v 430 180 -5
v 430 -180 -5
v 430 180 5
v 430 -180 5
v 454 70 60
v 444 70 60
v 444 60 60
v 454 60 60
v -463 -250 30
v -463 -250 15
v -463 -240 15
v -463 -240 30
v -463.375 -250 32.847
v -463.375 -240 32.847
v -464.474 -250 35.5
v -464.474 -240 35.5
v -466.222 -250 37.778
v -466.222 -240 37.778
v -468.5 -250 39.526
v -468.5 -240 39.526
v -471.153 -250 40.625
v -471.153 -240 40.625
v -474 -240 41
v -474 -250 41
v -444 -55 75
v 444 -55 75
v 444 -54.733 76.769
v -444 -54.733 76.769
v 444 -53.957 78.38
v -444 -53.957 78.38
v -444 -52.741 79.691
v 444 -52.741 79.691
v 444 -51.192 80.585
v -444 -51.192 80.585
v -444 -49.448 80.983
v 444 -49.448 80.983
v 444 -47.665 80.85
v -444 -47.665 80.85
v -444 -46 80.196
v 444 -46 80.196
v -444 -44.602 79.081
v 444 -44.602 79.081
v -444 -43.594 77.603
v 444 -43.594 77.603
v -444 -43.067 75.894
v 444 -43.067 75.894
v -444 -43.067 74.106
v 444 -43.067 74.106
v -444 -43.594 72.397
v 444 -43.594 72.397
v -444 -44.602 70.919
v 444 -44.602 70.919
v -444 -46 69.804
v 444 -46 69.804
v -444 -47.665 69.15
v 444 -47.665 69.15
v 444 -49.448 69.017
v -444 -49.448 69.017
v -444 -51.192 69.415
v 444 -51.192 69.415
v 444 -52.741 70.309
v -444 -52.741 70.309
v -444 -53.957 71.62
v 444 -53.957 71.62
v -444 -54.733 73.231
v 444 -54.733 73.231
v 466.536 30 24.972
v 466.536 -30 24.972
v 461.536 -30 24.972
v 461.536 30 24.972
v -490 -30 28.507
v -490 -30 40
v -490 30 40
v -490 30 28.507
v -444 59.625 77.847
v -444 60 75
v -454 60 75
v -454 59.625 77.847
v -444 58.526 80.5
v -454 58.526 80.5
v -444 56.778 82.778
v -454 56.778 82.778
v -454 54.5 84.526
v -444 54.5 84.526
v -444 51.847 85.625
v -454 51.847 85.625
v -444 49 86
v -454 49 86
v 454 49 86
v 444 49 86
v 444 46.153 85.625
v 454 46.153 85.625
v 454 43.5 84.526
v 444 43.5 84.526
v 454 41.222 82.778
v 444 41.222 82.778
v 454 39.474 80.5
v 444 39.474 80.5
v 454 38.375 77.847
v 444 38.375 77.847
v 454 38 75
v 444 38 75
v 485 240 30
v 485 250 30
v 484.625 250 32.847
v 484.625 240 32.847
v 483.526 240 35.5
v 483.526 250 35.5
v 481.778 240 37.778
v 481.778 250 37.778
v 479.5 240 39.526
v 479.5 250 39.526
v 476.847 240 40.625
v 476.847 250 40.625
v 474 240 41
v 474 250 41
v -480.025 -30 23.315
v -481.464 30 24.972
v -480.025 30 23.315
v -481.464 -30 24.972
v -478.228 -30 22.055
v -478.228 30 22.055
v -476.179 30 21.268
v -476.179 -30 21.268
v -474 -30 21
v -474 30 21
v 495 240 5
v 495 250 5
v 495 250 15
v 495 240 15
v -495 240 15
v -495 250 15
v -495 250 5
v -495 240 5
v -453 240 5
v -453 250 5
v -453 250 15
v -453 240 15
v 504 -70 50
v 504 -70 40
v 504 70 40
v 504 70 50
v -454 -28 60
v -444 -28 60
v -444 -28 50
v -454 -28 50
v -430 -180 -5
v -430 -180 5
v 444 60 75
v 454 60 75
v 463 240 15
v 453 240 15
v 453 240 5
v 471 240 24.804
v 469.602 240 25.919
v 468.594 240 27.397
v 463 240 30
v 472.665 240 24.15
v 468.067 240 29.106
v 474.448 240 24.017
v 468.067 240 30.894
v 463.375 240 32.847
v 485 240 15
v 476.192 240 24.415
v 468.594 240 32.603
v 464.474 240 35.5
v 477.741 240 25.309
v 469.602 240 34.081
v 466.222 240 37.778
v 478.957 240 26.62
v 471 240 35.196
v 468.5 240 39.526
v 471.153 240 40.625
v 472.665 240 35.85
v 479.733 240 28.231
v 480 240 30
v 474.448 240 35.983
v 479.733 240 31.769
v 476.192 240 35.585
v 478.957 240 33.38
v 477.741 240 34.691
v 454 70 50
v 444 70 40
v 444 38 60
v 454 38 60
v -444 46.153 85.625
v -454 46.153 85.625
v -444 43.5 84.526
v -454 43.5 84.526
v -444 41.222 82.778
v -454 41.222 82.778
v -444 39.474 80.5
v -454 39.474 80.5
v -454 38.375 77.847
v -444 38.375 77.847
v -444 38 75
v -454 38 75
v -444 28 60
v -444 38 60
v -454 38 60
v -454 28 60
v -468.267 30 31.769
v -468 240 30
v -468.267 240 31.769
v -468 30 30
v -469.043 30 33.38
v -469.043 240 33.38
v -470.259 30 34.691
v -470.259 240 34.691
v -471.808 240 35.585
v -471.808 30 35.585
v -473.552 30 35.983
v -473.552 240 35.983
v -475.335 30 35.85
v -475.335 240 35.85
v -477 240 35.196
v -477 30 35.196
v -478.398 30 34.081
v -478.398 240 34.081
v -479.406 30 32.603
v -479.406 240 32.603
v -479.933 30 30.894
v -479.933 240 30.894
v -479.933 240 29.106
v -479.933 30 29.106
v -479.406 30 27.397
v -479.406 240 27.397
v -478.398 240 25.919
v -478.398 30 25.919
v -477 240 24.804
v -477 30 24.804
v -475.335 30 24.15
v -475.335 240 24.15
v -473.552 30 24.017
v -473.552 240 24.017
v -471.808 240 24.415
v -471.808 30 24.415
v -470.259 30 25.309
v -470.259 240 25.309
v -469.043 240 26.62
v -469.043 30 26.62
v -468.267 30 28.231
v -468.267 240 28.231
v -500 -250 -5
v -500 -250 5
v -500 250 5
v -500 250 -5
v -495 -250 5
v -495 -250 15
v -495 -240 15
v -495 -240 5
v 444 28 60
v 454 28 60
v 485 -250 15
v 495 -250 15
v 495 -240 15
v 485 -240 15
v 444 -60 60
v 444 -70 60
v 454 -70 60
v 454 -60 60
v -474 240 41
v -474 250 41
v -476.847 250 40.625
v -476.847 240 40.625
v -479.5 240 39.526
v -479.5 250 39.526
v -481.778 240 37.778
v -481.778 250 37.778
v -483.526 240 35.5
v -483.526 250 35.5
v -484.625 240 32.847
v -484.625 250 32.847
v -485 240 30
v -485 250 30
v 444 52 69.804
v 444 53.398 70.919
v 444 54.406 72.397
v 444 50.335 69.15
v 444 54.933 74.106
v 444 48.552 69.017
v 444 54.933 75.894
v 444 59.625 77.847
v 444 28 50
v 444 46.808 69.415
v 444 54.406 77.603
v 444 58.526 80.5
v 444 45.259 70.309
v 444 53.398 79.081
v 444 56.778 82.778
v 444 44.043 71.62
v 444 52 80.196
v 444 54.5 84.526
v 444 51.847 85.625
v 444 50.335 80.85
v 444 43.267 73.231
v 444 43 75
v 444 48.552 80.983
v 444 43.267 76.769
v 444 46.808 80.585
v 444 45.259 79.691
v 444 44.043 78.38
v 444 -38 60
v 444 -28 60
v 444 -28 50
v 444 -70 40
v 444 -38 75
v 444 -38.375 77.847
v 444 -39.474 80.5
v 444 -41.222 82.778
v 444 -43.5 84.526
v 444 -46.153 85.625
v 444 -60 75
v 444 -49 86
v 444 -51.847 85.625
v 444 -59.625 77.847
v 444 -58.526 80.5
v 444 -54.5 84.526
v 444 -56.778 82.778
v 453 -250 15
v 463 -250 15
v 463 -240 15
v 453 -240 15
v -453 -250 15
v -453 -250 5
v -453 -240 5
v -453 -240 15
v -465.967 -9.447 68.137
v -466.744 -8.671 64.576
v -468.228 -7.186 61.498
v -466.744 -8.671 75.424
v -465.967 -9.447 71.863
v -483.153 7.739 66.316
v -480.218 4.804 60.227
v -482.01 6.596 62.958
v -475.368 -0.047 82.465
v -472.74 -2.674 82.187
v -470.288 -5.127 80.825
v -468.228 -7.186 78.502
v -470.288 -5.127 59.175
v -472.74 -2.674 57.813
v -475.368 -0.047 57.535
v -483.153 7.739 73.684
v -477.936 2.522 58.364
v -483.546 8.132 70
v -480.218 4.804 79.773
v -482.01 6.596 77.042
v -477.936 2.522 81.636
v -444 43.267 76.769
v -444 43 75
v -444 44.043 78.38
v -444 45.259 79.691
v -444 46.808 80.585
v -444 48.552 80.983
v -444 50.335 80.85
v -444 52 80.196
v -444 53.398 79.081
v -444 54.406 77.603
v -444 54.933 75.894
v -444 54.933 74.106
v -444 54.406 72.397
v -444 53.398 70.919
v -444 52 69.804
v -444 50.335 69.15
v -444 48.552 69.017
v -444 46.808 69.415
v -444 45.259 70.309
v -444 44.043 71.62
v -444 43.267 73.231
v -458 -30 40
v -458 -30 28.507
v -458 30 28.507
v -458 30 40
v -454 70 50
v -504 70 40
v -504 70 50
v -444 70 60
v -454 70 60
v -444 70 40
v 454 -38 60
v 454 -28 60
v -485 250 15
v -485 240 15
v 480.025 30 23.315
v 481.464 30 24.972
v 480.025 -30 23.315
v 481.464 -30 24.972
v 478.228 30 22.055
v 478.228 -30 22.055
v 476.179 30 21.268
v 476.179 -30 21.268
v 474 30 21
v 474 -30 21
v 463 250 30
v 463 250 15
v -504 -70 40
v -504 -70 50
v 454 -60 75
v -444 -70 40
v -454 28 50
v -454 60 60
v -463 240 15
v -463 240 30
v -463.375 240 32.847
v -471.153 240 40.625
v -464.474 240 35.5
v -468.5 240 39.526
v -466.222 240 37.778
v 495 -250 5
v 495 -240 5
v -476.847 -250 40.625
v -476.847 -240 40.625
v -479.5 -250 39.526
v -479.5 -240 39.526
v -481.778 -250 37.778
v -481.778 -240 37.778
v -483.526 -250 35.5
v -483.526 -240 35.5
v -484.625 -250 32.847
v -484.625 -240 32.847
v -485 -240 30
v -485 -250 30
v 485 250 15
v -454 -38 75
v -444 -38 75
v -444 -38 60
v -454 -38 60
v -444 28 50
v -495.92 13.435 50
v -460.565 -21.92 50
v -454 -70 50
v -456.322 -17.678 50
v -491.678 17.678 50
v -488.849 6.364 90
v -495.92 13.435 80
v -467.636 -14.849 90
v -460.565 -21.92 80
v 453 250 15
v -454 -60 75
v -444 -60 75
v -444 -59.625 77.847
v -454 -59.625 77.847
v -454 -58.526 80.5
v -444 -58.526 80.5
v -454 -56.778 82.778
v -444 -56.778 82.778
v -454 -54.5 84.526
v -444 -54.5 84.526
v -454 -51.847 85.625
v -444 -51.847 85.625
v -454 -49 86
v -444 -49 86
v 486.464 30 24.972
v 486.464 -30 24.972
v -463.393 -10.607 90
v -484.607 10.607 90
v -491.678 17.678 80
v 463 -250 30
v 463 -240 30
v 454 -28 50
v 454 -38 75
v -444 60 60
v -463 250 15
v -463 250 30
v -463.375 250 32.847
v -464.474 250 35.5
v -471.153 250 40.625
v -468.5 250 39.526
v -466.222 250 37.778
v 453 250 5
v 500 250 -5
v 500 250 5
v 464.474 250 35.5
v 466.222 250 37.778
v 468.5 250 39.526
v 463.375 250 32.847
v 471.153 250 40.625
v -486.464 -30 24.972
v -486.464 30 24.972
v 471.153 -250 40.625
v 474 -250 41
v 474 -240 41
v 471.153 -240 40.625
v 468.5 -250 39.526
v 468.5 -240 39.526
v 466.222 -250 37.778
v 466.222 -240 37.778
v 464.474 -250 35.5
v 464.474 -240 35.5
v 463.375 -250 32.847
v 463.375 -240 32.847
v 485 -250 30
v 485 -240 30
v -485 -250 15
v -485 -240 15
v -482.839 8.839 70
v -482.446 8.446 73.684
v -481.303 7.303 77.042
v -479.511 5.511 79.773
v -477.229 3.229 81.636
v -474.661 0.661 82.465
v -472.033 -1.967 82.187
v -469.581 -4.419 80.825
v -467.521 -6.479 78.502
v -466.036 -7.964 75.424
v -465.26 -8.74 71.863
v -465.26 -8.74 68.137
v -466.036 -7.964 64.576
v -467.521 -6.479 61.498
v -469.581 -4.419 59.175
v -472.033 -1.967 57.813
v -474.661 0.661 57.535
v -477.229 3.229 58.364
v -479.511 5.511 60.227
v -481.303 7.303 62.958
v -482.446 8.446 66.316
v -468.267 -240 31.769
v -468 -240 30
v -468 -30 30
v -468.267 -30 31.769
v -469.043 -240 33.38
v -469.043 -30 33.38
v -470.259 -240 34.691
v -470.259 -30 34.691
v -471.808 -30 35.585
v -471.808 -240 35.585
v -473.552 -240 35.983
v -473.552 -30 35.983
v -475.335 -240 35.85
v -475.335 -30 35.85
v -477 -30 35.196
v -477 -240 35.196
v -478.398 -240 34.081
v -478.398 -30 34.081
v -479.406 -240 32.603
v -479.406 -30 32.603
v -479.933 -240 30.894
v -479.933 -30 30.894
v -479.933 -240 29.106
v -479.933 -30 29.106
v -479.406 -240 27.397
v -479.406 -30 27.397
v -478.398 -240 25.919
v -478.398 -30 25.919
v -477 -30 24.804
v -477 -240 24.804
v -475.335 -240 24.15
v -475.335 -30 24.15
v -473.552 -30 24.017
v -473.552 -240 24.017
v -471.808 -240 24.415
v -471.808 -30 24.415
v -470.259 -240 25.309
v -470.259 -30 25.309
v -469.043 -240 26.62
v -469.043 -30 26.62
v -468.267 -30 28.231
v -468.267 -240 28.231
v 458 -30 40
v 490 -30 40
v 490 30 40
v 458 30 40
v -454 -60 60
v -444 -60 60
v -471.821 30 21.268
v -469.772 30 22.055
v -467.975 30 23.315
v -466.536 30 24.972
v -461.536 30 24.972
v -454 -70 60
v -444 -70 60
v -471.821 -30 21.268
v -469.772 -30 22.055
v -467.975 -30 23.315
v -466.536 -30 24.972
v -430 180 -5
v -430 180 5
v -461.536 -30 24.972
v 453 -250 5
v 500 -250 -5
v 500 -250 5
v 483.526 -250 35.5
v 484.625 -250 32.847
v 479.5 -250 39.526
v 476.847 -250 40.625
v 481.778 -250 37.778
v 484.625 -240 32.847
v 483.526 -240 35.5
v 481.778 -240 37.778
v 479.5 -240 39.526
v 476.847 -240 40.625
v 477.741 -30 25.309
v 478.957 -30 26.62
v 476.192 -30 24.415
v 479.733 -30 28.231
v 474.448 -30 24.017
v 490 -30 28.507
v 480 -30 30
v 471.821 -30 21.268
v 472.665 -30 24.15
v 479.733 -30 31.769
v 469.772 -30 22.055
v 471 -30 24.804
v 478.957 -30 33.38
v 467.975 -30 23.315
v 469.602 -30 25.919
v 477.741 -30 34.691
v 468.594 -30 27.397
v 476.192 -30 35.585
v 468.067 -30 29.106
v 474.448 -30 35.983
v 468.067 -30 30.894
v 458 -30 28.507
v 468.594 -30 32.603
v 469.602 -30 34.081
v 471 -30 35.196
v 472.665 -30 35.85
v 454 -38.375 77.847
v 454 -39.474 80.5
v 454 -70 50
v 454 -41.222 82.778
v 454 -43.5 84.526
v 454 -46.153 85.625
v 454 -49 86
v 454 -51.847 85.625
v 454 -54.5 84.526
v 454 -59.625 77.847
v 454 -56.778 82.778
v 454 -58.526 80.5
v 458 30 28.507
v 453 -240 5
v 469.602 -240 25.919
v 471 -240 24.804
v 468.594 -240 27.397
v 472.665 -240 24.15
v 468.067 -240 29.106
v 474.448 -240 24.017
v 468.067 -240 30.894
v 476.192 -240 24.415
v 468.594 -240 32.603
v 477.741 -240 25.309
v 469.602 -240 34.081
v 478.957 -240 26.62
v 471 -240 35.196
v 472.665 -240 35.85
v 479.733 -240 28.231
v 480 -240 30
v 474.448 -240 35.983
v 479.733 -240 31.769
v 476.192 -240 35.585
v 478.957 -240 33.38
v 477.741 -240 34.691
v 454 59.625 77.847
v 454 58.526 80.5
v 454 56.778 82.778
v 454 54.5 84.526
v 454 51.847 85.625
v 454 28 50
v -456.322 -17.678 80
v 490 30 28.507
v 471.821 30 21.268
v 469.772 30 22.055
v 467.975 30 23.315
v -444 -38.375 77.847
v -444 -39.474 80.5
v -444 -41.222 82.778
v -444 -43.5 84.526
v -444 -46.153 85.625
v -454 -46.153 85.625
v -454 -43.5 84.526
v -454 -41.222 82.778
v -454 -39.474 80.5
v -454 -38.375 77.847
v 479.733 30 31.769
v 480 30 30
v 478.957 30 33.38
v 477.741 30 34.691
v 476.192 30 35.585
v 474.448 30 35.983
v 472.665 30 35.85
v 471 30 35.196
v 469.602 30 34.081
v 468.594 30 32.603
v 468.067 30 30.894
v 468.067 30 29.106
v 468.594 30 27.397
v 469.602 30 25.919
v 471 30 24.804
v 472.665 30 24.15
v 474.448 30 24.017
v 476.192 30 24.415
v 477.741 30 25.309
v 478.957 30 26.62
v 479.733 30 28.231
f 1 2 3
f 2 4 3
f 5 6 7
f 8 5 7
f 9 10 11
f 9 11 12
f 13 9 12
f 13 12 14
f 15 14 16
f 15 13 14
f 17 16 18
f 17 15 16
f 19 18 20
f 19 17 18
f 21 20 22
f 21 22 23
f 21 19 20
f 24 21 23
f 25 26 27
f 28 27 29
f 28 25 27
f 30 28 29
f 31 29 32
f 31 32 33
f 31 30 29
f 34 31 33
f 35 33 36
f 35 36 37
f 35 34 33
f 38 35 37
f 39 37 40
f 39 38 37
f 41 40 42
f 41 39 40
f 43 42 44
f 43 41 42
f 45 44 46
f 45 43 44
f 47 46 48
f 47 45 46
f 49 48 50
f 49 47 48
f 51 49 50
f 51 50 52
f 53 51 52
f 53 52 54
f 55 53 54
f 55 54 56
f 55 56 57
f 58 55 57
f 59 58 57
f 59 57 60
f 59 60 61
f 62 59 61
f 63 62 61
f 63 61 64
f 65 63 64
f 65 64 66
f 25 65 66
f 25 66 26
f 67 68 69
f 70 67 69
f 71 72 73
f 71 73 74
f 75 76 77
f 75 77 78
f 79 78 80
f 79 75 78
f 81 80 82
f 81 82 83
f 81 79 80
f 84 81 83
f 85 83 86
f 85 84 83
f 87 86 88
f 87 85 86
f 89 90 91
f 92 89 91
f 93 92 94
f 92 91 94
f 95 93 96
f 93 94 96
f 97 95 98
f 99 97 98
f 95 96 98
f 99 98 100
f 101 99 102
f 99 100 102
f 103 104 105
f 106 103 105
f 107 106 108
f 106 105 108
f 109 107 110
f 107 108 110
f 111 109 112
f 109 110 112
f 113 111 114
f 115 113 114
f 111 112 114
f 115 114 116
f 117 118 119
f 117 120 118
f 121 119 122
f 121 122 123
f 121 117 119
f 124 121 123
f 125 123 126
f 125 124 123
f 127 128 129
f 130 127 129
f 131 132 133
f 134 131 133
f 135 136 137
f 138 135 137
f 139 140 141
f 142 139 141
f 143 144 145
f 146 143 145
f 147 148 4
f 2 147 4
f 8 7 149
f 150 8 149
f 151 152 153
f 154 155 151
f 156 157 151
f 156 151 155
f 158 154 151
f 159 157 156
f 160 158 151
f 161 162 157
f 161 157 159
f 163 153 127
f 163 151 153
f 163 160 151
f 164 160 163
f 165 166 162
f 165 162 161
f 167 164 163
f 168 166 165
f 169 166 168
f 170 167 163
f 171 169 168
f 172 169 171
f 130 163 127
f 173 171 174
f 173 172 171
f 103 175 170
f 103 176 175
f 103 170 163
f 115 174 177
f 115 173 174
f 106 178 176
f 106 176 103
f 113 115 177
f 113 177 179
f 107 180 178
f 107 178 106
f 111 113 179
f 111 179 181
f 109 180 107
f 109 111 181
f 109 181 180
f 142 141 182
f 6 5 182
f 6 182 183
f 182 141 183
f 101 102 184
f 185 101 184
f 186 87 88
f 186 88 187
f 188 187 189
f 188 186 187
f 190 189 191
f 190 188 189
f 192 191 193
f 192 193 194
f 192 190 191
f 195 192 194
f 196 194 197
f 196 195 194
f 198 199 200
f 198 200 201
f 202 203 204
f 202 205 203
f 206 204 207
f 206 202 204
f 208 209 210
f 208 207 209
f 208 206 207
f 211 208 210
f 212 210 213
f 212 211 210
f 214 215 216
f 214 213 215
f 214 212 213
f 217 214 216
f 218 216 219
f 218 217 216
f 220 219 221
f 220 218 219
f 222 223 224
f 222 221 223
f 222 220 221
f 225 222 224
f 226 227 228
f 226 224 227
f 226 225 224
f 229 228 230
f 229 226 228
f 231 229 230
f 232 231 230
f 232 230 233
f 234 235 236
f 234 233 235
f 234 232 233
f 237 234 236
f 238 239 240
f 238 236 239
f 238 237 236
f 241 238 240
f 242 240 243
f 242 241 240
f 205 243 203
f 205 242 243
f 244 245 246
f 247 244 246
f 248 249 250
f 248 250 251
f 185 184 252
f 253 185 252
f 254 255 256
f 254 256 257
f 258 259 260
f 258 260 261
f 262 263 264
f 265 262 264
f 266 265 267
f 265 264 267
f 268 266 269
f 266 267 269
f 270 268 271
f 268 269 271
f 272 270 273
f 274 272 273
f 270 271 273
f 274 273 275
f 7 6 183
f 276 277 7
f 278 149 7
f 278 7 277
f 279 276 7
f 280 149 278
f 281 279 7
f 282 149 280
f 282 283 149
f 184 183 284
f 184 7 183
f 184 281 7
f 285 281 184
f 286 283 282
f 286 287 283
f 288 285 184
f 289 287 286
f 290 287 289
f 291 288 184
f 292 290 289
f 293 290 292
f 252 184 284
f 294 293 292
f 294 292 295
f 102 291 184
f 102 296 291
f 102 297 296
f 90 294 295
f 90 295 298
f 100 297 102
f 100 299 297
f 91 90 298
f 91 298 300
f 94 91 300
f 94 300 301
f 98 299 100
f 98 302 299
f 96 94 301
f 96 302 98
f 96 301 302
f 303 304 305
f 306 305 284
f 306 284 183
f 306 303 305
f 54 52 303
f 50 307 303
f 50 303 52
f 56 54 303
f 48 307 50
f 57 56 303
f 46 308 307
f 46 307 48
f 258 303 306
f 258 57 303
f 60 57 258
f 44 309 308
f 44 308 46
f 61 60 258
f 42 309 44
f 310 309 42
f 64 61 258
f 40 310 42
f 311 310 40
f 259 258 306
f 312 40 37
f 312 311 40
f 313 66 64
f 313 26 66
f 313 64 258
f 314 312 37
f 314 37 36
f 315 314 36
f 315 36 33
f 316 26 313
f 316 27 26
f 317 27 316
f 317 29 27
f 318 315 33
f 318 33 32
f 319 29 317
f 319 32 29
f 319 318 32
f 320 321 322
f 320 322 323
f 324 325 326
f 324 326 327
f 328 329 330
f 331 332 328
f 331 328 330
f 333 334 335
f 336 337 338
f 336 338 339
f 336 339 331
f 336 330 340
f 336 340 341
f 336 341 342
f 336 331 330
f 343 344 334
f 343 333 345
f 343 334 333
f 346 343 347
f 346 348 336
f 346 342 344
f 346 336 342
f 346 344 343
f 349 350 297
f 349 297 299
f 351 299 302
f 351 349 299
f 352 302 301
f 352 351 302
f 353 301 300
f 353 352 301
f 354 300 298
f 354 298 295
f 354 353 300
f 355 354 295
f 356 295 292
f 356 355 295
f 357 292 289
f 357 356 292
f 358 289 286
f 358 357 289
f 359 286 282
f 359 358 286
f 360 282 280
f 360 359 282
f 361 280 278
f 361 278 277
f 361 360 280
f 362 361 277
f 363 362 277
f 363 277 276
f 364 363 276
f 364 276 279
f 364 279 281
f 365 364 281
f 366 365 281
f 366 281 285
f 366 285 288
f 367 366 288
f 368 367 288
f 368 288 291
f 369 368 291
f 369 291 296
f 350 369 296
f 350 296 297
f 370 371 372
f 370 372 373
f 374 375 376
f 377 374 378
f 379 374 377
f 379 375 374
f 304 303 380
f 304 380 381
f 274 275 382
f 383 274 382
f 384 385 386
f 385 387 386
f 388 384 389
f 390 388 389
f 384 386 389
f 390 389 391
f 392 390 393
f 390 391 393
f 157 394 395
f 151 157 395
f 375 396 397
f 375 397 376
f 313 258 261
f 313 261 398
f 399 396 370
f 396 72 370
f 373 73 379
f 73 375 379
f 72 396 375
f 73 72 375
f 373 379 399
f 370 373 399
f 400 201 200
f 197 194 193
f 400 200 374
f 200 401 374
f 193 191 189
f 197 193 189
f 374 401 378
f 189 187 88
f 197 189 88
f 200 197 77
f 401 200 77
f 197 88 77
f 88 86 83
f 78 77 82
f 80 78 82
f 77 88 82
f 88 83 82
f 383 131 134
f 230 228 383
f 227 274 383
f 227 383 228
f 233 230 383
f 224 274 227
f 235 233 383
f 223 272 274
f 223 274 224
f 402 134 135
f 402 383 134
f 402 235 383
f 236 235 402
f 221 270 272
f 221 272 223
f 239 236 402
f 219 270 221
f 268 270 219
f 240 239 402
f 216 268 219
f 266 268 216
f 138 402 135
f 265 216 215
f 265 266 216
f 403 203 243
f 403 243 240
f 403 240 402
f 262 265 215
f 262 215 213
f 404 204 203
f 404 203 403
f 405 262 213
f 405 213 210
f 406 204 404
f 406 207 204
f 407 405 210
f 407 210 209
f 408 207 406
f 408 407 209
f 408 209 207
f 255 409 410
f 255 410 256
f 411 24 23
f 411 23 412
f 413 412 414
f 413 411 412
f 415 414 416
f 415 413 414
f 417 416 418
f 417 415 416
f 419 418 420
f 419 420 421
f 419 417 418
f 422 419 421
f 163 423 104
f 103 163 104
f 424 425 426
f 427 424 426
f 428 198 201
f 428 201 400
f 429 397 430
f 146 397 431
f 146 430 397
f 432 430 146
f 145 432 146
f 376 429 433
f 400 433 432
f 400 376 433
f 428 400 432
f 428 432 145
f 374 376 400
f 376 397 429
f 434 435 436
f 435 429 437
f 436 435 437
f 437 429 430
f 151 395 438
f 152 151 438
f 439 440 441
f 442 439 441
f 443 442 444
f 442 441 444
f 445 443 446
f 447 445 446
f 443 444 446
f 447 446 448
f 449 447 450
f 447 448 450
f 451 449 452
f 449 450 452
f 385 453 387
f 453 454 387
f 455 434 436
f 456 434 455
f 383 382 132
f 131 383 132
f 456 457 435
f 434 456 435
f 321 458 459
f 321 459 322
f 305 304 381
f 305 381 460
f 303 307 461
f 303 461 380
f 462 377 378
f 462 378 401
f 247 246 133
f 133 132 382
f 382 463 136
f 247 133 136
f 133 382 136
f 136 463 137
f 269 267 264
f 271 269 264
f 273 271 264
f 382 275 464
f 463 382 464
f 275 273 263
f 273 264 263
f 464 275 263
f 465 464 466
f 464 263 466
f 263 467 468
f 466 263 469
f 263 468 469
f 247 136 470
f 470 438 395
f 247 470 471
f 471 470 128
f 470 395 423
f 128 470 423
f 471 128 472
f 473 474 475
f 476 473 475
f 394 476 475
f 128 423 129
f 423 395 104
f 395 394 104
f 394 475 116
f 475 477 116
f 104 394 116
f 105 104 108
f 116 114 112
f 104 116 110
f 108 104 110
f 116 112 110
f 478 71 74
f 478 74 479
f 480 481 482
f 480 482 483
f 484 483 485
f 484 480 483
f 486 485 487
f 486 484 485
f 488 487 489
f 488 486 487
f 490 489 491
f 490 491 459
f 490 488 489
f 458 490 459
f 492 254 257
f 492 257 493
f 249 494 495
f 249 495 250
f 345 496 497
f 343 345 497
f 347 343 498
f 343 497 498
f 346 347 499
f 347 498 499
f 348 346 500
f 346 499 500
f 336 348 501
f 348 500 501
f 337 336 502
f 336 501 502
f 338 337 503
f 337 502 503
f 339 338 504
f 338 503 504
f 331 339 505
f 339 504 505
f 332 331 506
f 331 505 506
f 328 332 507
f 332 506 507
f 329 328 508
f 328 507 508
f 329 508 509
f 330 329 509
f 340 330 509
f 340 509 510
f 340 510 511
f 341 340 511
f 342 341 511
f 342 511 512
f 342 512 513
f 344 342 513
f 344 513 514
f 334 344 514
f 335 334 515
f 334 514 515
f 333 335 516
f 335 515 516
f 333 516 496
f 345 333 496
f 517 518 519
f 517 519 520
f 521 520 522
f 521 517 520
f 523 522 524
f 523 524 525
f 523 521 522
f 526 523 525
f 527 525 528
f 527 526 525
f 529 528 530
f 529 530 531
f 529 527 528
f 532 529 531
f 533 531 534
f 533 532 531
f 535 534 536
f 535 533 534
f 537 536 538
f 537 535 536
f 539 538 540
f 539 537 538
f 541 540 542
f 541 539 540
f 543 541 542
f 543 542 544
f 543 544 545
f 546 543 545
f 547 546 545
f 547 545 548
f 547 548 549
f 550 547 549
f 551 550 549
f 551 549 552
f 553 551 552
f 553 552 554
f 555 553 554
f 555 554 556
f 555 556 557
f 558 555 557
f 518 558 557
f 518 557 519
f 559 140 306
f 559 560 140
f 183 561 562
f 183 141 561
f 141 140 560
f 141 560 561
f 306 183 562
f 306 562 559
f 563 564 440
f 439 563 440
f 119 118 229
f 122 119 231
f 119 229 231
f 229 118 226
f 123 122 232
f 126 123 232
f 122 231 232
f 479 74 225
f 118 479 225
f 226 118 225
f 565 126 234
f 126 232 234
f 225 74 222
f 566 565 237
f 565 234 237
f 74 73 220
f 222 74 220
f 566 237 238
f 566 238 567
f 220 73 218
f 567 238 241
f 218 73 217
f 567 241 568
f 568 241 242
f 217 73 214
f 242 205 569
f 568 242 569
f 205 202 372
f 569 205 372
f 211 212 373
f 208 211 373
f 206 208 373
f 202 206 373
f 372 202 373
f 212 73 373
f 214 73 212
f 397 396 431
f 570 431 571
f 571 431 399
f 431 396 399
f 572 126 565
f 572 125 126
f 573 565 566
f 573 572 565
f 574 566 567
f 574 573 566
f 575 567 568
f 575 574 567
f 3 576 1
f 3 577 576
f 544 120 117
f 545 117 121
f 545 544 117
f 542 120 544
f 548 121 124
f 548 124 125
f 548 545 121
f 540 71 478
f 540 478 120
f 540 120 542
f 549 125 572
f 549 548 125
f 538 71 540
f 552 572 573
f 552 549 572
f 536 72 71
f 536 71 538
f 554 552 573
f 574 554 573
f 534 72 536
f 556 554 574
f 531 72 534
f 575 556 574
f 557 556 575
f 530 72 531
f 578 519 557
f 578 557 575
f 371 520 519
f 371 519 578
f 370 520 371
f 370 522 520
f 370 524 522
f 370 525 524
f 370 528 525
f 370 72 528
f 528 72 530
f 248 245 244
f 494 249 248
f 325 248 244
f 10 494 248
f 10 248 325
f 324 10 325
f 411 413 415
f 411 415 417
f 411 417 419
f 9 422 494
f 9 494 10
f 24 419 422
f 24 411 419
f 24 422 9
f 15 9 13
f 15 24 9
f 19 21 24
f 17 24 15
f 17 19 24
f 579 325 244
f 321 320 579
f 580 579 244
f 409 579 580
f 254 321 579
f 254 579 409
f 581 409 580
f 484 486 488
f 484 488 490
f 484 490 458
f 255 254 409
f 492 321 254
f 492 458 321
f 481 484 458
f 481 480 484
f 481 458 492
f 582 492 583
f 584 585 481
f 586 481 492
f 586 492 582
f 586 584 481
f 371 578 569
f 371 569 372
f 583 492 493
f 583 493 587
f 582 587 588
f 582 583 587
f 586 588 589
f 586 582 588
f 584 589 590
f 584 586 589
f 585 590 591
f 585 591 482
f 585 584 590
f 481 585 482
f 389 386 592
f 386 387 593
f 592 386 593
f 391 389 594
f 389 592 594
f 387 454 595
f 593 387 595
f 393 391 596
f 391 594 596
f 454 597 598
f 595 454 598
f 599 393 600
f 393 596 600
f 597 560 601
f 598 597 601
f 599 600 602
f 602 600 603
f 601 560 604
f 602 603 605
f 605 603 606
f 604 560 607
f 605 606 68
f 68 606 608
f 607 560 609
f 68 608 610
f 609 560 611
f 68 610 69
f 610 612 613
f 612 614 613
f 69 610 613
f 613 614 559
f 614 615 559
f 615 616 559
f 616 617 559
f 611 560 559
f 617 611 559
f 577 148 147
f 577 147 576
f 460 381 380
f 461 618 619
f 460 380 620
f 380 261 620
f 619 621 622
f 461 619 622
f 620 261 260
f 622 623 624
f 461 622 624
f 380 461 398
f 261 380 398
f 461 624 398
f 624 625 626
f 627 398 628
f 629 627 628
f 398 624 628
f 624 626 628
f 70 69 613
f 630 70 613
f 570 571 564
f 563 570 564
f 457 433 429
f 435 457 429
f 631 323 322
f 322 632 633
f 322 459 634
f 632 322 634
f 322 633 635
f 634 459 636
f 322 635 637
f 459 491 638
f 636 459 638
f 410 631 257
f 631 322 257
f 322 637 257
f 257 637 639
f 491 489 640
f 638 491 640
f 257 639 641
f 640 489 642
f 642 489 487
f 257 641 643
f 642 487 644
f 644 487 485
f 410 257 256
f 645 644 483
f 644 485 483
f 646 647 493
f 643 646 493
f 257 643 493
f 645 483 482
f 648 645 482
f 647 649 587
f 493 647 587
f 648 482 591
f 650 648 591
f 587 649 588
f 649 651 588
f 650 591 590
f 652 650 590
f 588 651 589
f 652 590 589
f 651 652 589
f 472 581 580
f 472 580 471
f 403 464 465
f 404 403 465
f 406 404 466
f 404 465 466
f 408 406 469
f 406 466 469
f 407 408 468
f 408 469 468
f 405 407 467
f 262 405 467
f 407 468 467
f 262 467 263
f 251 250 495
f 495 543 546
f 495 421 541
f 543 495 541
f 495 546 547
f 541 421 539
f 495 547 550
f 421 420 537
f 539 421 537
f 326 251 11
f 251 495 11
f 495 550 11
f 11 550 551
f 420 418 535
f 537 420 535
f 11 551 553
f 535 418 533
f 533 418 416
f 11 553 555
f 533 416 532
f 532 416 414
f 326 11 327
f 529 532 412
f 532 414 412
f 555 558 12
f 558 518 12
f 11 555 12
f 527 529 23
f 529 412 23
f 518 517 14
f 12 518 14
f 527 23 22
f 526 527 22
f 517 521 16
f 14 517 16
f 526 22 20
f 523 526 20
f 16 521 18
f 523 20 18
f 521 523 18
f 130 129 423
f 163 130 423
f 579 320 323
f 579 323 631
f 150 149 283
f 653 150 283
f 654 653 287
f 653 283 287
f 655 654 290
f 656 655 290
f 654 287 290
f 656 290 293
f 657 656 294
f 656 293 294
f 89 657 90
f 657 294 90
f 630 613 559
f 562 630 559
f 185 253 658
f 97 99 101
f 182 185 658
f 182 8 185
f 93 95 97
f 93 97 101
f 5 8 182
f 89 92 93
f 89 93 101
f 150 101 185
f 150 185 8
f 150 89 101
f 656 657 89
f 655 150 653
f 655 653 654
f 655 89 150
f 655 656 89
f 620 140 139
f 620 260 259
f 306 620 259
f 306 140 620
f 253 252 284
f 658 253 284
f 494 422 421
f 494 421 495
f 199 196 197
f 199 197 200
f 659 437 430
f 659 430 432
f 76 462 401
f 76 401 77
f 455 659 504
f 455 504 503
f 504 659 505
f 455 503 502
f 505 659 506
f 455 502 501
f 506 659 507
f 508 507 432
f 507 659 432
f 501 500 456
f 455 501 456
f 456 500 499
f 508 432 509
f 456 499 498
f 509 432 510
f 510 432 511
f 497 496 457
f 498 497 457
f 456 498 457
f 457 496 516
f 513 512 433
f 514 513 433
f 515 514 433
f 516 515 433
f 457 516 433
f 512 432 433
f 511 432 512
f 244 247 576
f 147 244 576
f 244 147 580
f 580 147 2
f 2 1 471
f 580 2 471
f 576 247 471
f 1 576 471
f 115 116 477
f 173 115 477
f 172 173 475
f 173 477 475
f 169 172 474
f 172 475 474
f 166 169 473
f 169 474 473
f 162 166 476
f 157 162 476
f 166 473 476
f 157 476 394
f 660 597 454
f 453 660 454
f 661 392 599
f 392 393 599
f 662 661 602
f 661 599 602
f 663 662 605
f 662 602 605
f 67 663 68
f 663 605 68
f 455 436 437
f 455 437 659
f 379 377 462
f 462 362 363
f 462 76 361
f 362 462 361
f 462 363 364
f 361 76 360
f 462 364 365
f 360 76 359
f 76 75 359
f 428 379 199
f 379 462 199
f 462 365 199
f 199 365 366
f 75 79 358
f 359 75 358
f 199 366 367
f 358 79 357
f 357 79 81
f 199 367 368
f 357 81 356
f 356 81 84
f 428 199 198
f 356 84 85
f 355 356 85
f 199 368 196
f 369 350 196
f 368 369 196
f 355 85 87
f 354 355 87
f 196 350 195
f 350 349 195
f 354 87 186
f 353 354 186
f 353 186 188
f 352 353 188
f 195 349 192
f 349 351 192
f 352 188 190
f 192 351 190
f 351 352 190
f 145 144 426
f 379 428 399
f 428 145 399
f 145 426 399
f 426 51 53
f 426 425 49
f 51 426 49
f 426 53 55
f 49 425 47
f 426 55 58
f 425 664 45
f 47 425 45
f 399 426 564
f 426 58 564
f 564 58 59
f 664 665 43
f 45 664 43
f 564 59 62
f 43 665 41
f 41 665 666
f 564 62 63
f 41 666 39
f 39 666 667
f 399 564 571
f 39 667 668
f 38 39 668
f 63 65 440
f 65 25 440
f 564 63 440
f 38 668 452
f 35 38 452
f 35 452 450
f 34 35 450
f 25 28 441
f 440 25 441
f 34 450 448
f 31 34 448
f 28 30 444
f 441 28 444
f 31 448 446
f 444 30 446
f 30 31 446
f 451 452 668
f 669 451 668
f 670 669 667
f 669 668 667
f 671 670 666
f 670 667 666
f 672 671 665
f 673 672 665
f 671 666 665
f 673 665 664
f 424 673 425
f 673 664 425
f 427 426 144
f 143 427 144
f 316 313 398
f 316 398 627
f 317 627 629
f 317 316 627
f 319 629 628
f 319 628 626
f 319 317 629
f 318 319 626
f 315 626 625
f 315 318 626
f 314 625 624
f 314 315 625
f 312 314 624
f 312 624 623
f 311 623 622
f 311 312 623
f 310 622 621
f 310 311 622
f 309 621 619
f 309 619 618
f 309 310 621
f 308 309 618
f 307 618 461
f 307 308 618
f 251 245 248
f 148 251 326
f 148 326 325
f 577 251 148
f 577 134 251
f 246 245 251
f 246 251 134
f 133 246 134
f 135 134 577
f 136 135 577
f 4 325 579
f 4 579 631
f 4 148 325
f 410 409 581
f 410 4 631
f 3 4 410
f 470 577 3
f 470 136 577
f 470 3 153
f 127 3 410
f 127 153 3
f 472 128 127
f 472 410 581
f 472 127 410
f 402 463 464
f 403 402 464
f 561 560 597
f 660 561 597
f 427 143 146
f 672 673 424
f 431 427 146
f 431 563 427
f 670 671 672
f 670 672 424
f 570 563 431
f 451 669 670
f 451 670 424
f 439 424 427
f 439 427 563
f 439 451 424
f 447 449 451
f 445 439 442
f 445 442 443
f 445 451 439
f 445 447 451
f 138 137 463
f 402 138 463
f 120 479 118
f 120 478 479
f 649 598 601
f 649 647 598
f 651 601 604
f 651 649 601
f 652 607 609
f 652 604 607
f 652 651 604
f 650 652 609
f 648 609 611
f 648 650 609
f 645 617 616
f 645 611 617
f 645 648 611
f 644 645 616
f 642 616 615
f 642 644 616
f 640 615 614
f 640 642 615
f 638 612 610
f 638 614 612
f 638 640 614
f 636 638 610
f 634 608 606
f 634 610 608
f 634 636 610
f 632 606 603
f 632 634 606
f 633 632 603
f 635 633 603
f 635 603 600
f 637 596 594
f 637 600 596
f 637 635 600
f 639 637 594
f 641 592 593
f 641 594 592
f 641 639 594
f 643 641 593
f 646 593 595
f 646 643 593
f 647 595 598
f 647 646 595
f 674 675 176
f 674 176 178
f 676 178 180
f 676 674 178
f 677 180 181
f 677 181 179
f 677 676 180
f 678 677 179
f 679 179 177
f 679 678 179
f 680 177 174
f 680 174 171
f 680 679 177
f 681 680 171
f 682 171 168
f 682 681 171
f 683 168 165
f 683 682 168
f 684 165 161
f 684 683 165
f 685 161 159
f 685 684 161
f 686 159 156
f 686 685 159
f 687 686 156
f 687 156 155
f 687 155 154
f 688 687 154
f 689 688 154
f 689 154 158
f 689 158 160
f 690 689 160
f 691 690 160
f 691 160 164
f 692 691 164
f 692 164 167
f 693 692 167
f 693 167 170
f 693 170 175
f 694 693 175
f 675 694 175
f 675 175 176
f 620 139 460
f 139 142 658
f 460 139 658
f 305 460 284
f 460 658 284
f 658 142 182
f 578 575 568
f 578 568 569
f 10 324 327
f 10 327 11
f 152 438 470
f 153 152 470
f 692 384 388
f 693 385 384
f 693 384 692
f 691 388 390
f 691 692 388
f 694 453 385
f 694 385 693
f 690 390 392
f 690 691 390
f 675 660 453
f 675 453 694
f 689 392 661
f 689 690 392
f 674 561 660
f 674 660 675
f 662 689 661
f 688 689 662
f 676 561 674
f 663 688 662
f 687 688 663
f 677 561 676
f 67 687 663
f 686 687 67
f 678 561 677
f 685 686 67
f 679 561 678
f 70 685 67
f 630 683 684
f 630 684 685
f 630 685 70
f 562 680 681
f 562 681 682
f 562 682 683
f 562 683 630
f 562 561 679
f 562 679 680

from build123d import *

# Parameters (mm, degrees)
F0_W      = 1000
F0_H      = 500
F0_W_2    = 860
F0_H_2    = 360
F1_DEPTH  = 5
F2_R      = 6
F3_DEPTH  = 10
F5_R      = 6
F6_DEPTH  = 500
F8_DEPTH  = 30
F10_W     = 60
F10_H     = 140
F11_DEPTH = 10
F13_R     = 6
F14_DEPTH = 10
F17_R     = 6
F18_DEPTH = 908
F20_DEPTH = 40
F22_SIZE  = 10
F21_R     = 12.5
F23_DEPTH = 1


with BuildPart() as f1:
    # F0 (on Top) → F1 (new body, symmetric)
    with BuildSketch(Plane.XY):
        Rectangle(F0_W, F0_H)
        Rectangle(F0_W_2, F0_H_2, mode=Mode.SUBTRACT)
    extrude(amount=F1_DEPTH, both=True)

    # F2 (on face) → F3 (join)
    with BuildSketch(Plane.XZ.offset(250)):
        with BuildLine():
            ThreePointArc((-474, 41), (-481.7781745931, 37.7781745931), (-485, 30))
            Line((-485, 30), (-485, 15))
            Line((-485, 15), (-495, 15))
            Line((-495, 15), (-495, 5))
            Line((-495, 5), (-453, 5))
            Line((-453, 5), (-453, 15))
            Line((-453, 15), (-463, 15))
            Line((-463, 15), (-463, 30))
            ThreePointArc((-463, 30), (-466.2218254069, 37.7781745931), (-474, 41))
        make_face()
        with Locations((-474, 30)):
            Circle(F2_R, mode=Mode.SUBTRACT)
        with BuildLine():
            ThreePointArc((474, 41), (466.2218254069, 37.7781745931), (463, 30))
            Line((463, 30), (463, 15))
            Line((463, 15), (453, 15))
            Line((453, 15), (453, 5))
            Line((453, 5), (495, 5))
            Line((495, 5), (495, 15))
            Line((495, 15), (485, 15))
            Line((485, 15), (485, 30))
            ThreePointArc((485, 30), (481.7781745931, 37.7781745931), (474, 41))
        make_face()
        with Locations((474, 30)):
            Circle(F2_R, mode=Mode.SUBTRACT)
    extrude(amount=-F3_DEPTH)

    # F4: F1 across plane


with BuildPart() as f1_1:
    add(f1.part)
    add(f1.part.mirror(Plane.XZ))

    # F5 (on face) → F6 (join, through all)
    with BuildSketch(Plane.XZ.offset(250)):
        with Locations((-474, 30)):
            Circle(F5_R)
        with Locations((474, 30)):
            Circle(F5_R)
    extrude(amount=-F6_DEPTH)

    # F7 (on Front) → F8 (join, symmetric)
    with BuildSketch(Plane.XZ):
        with BuildLine():
            ThreePointArc((-474, 21), (-469.7722855411, 22.0547856886), (-466.5355339059, 24.9719043435))
            Line((-466.5355339059, 24.9719043435), (-461.5355339059, 24.9719043435))
            Line((-461.5355339059, 24.9719043435), (-458, 28.5074382495))
            Line((-458, 28.5074382495), (-458, 40))
            Line((-458, 40), (-474, 40))
            Line((-474, 40), (-490, 40))
            Line((-490, 40), (-490, 28.5074382495))
            Line((-490, 28.5074382495), (-486.4644660941, 24.9719043435))
            Line((-486.4644660941, 24.9719043435), (-481.4644660941, 24.9719043435))
            ThreePointArc((-481.4644660941, 24.9719043435), (-478.2277144589, 22.0547856886), (-474, 21))
        make_face()
    extrude(amount=F8_DEPTH, both=True)

    # F9: F1 across plane


with BuildPart() as f1_2:
    add(f1_1.part)
    add(f1_1.part.mirror(Plane.YZ))

    # F10 (on face) → F11 (join)
    with BuildSketch(Plane.XY.offset(40)):
        with Locations((-474, 0)):
            Rectangle(F10_W, F10_H)
    extrude(amount=F11_DEPTH)

    # F12: F1 across plane


with BuildPart() as f1_3:
    add(f1_2.part)
    add(f1_2.part.mirror(Plane.YZ))

    # F13 (on face) → F14 (join)
    with BuildSketch(Plane.YZ.offset(-444)):
        with BuildLine():
            Line((28, 60), (28, 50))
            Line((28, 50), (49, 50))
            Line((49, 50), (70, 50))
            Line((70, 50), (70, 60))
            Line((70, 60), (60, 60))
            Line((60, 60), (60, 75))
            ThreePointArc((60, 75), (56.7781745931, 82.7781745931), (49, 86))
            ThreePointArc((49, 86), (41.2218254069, 82.7781745931), (38, 75))
            Line((38, 75), (38, 60))
            Line((38, 60), (28, 60))
        make_face()
        with Locations((49, 75)):
            Circle(F13_R, mode=Mode.SUBTRACT)
    extrude(amount=-F14_DEPTH)

    # F15: F1 across plane


with BuildPart() as f1_4:
    add(f1_3.part)
    add(f1_3.part.mirror(Plane.XZ))

    # F16: F1 across plane


with BuildPart() as f1_5:
    add(f1_4.part)
    add(f1_4.part.mirror(Plane.YZ))

    # F17 (on face) → F18 (join, through all)
    with BuildSketch(Plane(origin=(-454, 0, 0), x_dir=(0, -1, 0), z_dir=(-1, 0, 0))):
        with Locations((-49, 75)):
            Circle(F17_R)
        with Locations((49, 75)):
            Circle(F17_R)
    extrude(amount=-F18_DEPTH)

    # F19 (on face) → F20 (join)
    with BuildSketch(Plane.XY.offset(50)):
        Polygon((-456.3223304703, -17.6776695297), (-491.6776695297, 17.6776695297), (-495.9203102168, 13.4350288425), (-460.5649711575, -21.9203102168), align=None)
    extrude(amount=F20_DEPTH)

    # F22
    f22_edges = [f1_5.edges().sort_by_distance(p)[0] for p in [
        (-458.443651, -19.79899, 90),
        (-493.79899, 15.556349, 90),
    ]]
    chamfer(f22_edges, length=F22_SIZE)

    # F21 (on face) → F23 (cut)
    with BuildSketch(Plane(origin=(-237, -237, 0), x_dir=(-0.7071067812, 0.7071067812, 0), z_dir=(0.7071067812, 0.7071067812, 0))):
        with Locations((335.1686142824, 70)):
            Circle(F21_R)
    extrude(amount=-F23_DEPTH, mode=Mode.SUBTRACT)


solid = f1_5.part
